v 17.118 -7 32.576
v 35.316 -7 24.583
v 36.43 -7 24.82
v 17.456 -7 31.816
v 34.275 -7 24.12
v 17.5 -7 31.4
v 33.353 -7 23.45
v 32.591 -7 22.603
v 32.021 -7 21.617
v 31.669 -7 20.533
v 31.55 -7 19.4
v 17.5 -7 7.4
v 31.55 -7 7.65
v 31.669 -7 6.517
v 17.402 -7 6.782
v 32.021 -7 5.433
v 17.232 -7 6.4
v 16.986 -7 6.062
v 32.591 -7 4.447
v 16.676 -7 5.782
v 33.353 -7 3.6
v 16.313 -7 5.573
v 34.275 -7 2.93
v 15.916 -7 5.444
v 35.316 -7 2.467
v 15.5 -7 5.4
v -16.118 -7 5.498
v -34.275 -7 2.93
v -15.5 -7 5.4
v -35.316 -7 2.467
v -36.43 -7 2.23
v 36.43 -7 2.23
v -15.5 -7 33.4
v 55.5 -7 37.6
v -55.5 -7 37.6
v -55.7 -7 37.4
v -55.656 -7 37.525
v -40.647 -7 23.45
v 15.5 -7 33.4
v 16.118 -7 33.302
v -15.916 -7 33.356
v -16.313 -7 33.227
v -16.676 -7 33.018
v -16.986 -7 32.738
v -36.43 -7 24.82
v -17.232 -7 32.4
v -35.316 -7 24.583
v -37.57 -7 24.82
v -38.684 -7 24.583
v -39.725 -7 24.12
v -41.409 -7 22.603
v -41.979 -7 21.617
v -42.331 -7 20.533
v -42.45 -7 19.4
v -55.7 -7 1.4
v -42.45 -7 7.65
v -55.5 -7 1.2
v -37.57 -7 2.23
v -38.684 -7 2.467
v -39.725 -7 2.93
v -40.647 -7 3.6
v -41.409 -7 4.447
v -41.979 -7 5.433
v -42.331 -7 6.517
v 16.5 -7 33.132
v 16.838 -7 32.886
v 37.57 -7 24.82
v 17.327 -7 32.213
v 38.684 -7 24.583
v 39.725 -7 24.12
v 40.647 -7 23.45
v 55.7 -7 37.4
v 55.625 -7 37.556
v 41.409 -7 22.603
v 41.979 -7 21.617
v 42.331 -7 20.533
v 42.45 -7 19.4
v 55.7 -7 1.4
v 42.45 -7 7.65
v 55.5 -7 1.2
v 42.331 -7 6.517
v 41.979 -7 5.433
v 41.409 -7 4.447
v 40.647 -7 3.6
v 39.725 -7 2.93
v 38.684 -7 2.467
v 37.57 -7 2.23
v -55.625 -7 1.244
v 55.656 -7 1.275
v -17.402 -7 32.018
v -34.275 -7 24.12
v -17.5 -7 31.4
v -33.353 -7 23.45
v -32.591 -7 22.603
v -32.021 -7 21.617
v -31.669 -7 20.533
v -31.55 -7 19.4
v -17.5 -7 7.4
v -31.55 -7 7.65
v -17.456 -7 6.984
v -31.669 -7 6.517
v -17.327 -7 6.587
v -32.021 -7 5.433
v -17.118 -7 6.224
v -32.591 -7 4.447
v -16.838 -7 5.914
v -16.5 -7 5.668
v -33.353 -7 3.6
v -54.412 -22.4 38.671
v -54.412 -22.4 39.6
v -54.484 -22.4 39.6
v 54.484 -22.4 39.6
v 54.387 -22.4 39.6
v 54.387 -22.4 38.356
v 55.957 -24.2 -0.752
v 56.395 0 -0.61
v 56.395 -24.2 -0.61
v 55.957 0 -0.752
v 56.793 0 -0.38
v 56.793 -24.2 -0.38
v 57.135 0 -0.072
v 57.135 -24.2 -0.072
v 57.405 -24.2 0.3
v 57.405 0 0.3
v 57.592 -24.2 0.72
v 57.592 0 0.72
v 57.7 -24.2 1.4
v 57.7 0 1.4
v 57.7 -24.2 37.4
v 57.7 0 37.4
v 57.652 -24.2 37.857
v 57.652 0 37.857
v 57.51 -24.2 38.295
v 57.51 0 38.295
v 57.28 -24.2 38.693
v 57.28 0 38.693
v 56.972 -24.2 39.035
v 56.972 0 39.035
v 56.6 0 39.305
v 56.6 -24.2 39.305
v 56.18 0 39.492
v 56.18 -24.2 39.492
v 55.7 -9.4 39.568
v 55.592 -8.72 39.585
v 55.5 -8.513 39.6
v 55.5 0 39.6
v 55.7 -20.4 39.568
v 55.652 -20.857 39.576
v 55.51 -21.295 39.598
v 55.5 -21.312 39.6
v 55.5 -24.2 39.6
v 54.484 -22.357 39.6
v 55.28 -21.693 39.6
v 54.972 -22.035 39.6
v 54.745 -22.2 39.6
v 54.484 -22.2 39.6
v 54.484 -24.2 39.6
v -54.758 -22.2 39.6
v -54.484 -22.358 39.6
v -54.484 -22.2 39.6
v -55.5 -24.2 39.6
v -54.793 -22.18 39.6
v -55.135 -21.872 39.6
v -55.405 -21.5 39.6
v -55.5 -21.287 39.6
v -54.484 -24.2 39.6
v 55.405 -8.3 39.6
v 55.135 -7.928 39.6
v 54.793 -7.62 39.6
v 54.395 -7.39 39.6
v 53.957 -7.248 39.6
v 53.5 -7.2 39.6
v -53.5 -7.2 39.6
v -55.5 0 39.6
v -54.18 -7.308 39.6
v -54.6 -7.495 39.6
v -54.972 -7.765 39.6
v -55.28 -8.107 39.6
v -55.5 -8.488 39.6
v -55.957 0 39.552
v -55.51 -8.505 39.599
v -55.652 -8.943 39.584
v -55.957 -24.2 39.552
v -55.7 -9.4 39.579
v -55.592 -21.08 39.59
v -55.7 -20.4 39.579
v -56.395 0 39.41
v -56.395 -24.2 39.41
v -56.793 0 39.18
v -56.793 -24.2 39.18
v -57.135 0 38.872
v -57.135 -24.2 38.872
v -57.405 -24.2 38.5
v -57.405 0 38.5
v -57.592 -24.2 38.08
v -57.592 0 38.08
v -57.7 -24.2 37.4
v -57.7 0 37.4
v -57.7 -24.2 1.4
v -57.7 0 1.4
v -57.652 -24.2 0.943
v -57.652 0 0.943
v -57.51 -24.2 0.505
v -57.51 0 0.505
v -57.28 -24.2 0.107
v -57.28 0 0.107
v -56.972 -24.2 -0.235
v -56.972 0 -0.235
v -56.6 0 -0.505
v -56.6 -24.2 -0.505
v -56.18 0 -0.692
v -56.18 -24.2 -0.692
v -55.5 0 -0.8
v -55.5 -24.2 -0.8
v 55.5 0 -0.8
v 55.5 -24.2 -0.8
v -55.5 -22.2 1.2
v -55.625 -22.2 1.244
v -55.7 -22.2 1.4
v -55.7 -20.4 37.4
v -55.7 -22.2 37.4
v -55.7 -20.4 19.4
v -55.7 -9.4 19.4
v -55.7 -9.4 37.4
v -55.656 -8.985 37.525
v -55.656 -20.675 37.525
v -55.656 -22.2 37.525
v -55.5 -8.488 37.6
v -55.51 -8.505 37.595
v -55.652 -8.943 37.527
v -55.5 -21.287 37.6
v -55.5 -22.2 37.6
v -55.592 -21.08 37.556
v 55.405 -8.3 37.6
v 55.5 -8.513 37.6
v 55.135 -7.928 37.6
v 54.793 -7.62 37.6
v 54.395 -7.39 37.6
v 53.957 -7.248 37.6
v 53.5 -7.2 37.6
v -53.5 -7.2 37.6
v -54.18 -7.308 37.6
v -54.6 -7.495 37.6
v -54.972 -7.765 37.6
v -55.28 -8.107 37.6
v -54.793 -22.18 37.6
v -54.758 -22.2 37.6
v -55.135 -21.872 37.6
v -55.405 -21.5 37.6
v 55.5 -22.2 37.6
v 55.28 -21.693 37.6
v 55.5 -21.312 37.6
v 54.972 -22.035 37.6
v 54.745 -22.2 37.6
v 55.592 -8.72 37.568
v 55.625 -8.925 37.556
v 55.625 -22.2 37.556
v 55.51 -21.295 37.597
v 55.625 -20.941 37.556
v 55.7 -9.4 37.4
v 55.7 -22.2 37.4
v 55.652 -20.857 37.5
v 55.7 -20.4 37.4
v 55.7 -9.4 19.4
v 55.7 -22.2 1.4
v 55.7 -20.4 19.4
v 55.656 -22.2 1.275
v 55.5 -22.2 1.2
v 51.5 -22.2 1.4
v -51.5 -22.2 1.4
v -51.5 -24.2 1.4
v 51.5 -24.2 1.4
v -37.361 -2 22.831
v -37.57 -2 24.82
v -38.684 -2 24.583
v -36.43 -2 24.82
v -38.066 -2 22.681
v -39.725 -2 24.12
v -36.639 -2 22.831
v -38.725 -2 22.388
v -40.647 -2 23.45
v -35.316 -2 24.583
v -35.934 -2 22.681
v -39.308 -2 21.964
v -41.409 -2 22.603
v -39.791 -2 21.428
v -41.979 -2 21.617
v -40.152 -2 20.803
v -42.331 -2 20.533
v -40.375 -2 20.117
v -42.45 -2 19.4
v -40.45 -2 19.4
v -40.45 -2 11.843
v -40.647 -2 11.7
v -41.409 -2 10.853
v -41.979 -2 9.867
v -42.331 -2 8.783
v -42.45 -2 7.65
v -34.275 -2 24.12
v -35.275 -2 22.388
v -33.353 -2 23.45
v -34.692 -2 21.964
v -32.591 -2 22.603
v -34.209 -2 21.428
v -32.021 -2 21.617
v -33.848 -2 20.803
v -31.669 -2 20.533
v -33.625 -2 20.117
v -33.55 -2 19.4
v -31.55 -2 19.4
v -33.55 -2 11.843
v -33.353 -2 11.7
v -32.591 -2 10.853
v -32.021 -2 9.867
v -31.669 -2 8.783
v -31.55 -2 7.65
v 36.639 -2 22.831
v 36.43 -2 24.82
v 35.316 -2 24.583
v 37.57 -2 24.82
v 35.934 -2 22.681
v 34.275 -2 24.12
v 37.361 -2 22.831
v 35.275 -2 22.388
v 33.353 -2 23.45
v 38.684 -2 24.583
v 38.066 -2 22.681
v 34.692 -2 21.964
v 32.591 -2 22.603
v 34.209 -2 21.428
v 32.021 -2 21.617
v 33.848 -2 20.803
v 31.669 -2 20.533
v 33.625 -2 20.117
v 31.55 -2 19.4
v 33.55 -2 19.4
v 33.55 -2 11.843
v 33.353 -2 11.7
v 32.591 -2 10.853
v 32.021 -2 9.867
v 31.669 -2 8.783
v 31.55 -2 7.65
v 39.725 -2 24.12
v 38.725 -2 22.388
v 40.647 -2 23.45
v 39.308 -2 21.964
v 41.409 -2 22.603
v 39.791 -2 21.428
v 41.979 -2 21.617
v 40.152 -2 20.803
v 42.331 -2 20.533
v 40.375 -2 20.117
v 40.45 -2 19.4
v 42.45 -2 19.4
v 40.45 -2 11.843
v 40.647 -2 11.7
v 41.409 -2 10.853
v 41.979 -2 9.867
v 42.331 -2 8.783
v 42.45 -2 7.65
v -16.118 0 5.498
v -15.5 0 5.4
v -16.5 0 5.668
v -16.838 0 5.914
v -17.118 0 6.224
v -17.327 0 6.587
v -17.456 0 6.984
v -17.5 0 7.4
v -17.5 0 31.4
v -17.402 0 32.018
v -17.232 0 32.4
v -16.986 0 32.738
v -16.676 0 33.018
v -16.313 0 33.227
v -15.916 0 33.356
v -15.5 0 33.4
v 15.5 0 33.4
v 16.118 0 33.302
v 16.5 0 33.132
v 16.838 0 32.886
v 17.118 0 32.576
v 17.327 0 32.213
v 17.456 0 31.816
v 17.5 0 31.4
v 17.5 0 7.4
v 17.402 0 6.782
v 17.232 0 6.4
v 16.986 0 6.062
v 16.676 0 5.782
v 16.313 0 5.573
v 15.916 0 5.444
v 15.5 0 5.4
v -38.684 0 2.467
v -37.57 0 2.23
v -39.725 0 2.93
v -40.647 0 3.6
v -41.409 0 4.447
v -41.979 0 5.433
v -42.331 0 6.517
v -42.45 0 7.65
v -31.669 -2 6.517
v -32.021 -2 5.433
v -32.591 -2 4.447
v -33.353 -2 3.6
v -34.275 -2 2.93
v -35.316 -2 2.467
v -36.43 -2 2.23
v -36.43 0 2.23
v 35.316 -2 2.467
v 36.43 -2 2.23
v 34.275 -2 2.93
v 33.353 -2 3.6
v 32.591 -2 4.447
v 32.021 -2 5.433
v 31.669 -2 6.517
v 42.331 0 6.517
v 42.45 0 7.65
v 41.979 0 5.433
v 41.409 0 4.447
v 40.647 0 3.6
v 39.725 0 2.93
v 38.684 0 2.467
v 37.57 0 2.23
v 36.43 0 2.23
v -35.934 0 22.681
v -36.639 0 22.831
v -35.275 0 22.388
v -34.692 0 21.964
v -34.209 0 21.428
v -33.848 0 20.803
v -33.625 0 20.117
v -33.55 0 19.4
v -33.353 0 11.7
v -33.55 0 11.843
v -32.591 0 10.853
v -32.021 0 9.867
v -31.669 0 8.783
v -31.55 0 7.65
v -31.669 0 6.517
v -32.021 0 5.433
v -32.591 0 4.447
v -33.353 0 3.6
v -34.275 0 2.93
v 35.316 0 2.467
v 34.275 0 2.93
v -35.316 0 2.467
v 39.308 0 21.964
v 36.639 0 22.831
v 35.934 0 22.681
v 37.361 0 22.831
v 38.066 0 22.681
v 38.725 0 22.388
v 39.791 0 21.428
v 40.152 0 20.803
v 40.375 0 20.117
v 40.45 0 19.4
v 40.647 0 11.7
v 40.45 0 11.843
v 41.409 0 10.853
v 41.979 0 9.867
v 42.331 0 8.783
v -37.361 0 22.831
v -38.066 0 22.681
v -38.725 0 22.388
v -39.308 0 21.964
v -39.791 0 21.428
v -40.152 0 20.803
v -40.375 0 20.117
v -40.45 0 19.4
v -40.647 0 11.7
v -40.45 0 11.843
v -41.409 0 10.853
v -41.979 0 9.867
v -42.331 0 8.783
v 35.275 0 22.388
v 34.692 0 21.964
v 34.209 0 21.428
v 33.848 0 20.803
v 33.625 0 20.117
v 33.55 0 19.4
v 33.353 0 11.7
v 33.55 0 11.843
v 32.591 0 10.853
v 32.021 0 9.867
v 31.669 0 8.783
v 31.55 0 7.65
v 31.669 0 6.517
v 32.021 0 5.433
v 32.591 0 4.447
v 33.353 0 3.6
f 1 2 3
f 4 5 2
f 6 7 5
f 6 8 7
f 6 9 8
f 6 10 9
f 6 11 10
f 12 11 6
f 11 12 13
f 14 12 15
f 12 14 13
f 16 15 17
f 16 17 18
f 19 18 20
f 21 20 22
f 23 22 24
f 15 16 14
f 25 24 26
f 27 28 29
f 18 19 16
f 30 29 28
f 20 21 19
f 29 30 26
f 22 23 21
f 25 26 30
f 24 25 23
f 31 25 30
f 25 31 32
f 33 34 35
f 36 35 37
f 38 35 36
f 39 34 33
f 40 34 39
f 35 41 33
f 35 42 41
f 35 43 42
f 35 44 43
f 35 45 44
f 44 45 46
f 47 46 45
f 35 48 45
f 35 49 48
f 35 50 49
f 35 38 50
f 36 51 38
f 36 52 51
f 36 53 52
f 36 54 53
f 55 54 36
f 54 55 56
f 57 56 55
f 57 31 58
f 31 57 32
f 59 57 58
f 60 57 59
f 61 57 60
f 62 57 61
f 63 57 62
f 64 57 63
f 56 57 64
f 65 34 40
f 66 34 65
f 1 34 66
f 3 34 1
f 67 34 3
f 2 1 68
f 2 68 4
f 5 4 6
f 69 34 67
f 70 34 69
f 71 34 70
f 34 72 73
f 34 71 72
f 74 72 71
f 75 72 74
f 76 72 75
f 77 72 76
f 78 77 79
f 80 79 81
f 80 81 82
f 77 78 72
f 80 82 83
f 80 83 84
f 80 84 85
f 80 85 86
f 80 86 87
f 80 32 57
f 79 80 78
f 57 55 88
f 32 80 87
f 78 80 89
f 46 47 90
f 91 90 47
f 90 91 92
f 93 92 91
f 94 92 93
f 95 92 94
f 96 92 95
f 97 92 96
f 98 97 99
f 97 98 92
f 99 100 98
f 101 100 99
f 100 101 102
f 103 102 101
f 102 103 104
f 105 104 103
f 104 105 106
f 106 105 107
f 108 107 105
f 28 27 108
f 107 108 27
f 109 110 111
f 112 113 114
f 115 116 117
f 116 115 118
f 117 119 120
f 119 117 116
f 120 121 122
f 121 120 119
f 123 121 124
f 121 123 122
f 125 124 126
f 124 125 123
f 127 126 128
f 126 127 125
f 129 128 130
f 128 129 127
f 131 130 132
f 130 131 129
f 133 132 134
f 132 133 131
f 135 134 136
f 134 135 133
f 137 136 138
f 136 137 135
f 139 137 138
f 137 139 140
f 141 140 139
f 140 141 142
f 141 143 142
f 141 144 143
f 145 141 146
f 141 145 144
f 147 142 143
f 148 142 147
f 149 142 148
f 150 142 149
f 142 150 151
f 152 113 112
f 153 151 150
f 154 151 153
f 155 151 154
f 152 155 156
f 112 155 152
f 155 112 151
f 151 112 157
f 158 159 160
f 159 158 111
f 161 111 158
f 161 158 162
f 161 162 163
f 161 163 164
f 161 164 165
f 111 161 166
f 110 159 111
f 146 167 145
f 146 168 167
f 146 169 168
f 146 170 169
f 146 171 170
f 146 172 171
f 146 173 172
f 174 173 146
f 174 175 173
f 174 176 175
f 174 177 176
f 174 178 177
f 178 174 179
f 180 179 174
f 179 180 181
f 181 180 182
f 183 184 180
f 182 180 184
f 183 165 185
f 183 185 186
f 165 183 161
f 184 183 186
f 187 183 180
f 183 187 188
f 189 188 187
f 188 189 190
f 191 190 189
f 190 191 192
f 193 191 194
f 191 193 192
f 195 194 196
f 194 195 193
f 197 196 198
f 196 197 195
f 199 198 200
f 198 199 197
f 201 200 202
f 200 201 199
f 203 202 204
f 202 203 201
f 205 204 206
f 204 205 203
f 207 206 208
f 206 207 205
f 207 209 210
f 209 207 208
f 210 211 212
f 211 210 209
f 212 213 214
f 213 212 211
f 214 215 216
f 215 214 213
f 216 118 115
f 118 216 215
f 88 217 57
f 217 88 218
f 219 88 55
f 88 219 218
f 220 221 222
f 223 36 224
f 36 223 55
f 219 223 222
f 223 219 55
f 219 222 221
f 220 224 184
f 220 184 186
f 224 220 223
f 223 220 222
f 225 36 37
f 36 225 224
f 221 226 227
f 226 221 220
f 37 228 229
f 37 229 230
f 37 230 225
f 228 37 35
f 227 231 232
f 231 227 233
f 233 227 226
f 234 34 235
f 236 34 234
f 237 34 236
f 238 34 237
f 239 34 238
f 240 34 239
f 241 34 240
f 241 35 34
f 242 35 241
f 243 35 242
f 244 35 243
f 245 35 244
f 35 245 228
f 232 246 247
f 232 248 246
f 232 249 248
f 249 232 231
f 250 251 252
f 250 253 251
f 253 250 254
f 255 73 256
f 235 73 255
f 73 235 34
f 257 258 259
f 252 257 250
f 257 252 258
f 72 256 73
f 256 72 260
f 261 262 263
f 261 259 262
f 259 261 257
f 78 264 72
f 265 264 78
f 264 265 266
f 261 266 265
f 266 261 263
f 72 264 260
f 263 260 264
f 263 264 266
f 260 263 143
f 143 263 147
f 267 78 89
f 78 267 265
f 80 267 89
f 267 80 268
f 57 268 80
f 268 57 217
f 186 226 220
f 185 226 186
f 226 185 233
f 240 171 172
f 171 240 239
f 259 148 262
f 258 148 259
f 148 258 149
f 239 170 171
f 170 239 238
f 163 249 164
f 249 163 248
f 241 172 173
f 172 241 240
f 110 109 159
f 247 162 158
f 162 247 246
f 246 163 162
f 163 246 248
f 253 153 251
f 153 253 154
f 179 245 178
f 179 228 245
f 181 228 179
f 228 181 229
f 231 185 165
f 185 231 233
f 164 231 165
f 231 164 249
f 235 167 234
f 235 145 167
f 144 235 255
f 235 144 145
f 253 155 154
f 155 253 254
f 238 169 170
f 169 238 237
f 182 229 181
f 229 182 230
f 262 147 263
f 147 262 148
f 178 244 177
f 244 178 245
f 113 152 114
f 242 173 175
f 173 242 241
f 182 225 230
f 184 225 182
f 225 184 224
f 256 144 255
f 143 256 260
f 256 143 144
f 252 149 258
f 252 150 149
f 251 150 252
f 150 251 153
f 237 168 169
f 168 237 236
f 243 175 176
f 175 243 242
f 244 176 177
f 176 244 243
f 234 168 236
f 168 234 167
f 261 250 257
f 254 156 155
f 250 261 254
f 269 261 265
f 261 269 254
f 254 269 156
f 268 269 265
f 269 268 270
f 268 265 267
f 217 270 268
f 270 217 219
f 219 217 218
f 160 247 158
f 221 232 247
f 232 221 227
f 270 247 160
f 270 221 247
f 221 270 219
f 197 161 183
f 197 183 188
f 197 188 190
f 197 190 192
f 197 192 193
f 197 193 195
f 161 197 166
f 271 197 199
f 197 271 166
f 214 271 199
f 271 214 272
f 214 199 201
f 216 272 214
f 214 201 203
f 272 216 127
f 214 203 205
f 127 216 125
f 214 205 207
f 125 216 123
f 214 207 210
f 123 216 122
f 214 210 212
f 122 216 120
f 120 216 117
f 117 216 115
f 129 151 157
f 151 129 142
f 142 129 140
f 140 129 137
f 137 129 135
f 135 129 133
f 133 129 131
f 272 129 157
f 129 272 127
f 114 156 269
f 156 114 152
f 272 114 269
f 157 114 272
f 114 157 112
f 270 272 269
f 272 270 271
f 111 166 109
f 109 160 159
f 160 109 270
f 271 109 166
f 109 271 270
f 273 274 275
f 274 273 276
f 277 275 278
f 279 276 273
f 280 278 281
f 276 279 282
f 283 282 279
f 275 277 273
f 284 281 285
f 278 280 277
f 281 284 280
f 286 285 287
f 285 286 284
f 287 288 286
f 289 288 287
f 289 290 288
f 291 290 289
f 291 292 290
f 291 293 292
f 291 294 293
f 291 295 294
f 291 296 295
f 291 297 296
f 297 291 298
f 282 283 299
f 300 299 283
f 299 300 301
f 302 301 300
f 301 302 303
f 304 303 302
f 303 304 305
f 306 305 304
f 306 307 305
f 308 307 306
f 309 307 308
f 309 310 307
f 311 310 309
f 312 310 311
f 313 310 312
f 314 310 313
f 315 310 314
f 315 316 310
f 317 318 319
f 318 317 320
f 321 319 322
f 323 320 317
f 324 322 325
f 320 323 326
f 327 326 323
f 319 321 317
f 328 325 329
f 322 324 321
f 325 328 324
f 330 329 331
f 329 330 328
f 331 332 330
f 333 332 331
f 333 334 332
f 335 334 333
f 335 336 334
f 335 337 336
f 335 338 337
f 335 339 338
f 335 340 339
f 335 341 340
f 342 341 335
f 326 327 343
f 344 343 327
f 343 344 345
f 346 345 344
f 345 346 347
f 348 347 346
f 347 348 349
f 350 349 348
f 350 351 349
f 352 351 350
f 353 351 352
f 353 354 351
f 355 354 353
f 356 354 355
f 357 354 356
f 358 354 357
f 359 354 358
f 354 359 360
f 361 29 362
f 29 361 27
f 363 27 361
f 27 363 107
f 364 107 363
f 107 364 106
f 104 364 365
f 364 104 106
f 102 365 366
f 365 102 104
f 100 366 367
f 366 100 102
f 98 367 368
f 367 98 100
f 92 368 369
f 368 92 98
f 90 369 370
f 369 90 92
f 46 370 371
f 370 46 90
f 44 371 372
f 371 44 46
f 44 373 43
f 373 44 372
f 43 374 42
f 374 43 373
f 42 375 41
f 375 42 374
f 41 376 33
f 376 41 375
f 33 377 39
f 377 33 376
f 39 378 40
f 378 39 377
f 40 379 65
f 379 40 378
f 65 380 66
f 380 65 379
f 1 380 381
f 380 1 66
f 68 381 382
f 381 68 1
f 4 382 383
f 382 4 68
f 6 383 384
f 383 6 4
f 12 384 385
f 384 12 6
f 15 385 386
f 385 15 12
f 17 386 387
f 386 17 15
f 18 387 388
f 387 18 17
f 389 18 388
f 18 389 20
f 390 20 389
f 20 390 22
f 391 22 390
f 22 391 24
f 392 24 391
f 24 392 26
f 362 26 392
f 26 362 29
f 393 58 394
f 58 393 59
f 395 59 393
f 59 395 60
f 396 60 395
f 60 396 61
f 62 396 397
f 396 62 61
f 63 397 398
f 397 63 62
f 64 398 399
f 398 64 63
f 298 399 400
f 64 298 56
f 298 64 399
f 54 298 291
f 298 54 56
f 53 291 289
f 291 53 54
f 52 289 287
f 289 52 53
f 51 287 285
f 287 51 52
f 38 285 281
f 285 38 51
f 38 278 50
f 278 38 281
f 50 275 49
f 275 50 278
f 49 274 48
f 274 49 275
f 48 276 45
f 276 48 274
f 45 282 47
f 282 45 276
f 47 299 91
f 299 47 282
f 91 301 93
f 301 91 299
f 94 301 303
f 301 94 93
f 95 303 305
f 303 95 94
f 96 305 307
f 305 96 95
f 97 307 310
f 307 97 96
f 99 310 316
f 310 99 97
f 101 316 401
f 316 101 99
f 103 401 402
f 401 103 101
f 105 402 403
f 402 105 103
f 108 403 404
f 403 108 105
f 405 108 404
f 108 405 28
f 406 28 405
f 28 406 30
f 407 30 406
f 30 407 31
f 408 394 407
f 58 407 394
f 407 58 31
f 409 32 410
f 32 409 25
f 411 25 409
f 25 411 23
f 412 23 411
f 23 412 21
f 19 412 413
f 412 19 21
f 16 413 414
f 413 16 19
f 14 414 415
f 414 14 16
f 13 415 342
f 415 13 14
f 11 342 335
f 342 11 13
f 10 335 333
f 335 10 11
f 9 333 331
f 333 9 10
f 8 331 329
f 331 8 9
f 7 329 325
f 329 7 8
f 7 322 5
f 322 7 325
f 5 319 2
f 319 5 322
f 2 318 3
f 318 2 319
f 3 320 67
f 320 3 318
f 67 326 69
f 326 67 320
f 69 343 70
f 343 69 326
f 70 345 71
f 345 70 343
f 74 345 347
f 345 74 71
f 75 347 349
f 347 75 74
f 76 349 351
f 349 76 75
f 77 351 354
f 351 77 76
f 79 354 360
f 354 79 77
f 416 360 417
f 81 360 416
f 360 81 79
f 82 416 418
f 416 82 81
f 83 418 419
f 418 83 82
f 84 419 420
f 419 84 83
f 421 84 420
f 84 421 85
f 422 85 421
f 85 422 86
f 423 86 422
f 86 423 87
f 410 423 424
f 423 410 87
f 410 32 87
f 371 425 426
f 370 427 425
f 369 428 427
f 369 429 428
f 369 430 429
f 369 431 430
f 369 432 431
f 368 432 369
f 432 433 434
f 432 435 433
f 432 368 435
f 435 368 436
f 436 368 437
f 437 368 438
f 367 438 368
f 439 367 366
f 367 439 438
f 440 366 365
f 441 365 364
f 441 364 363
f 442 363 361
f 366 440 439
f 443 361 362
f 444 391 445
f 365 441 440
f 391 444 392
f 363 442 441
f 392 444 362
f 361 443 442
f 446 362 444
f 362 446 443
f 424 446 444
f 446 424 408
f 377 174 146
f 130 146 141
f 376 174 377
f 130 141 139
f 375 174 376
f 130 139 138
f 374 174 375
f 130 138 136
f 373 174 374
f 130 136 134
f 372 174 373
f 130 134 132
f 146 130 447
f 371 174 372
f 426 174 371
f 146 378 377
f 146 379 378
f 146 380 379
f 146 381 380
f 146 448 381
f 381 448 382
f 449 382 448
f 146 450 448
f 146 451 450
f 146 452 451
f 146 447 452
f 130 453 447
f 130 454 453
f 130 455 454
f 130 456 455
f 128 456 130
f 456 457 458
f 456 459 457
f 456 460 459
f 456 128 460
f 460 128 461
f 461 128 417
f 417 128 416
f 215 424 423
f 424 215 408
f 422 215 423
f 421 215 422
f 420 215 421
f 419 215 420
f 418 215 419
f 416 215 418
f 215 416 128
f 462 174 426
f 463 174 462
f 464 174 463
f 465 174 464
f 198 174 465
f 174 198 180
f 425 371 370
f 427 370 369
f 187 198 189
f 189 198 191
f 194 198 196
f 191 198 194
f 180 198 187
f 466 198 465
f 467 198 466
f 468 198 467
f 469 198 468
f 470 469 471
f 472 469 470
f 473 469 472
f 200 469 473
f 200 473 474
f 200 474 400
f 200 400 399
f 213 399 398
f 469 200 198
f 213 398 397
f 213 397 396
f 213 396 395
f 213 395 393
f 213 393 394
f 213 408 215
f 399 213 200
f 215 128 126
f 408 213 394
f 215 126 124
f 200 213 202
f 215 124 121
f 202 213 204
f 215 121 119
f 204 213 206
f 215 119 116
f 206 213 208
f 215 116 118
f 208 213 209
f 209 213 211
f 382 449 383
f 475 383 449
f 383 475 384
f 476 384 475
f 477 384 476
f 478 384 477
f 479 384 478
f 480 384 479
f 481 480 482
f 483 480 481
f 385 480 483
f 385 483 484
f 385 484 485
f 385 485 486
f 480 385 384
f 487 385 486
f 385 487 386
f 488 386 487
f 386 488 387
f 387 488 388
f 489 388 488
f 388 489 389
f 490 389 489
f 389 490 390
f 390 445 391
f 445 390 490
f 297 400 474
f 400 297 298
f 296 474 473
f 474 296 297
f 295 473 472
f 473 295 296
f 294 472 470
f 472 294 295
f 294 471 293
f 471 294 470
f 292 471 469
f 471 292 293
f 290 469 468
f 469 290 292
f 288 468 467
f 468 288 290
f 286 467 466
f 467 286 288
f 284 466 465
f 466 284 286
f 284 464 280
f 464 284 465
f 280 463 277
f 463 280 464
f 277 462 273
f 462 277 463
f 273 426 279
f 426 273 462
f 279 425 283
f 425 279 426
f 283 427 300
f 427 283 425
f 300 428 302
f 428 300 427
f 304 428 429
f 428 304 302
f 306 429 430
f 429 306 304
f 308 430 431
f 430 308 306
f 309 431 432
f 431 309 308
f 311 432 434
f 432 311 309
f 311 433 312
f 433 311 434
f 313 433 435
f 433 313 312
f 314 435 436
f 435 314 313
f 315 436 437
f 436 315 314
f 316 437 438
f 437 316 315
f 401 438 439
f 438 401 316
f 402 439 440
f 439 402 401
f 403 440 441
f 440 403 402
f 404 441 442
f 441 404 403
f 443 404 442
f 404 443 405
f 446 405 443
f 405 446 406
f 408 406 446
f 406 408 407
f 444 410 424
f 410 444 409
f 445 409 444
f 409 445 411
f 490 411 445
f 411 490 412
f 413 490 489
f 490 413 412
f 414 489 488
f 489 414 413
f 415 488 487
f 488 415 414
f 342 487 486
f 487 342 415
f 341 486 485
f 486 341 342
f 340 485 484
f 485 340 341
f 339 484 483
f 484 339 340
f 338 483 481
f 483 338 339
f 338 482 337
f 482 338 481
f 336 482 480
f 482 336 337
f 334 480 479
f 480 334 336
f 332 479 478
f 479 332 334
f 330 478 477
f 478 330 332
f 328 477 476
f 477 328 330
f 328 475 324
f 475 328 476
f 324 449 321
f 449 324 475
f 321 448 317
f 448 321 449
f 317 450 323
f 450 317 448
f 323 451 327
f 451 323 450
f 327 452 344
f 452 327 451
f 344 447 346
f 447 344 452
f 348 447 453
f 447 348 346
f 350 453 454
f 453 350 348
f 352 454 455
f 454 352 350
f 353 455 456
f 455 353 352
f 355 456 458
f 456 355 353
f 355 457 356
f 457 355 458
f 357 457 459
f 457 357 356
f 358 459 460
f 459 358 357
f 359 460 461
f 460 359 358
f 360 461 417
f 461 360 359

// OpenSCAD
// Bracket to hold FasTrak Flex transponder to windshield with suction cup.
// Adrian McCarthy 2023-06-20

etag_l = 111;
etag_w = 36;
etag_h = 15;

etag_logo_l = 35;
etag_logo_h = 28;
    
module etag_bracket2(th=2, nozzle_d=0.4) {
    suction_od = 30;
    suction_id = 6.5;
    suction_key = 10.5;
    suction_dx = max(suction_od, etag_l/1.5)/2;
    
    keyhole_h = suction_key/2 + suction_id;

    $fs = nozzle_d/2;

    module keyhole() {
        hull() {
            circle(d=suction_id + nozzle_d);
            translate([0, -keyhole_h])
                circle(d=suction_id + nozzle_d);
        }
        translate([0, -keyhole_h])
            circle(d=suction_key + nozzle_d);
    }
    
    module slot() {
        hull() {
            circle(d=suction_key + nozzle_d);
            translate([0, -keyhole_h])
                circle(d=suction_key + nozzle_d);
        }
    }
    
    module logo_window() {
        offset(th) offset(-th)
            square([etag_logo_l, etag_logo_h], center=true);
    }

    linear_extrude(2, convexity=10) {
        difference() {
            offset(r=th+nozzle_d/2)
                square([etag_l, etag_w], center=true);
            translate([-suction_dx, 0]) keyhole();
            translate([ suction_dx, 0]) keyhole();
            logo_window();
        }
    }
    translate([0, 0, 2]) {
        linear_extrude(5, convexity=10) {
            difference() {
                offset(r=th+nozzle_d/2)
                    square([etag_l, etag_w], center=true);
                translate([-suction_dx, 0]) slot();
                translate([ suction_dx, 0]) slot();
                logo_window();
            }
        }
        translate([0, 0, 5]) {
            difference() {
                linear_extrude(etag_h+nozzle_d, convexity=10) {
                    difference() {
                        offset(r=th+nozzle_d/2)
                            square([etag_l, etag_w], center=true);
                        offset(r=nozzle_d/2)
                            square([etag_l, etag_w], center=true);
                    }
                }
                translate([0, etag_w/2, etag_h/2+nozzle_d]) {
                    rotate([90, 0, 0]) {
                        linear_extrude(etag_w, convexity=4, center=true) {
                            offset(r=th+nozzle_d/2)
                                offset(r=-th)
                                    square([etag_l, etag_h], center=true);
                        }
                    }
                }
            }
            translate([0, 0, etag_h+nozzle_d/2]) {
                linear_extrude(th, convexity=10) {
                    difference() {
                        offset(r=th+nozzle_d/2)
                            square([etag_l, etag_w], center=true);
                        polygon([
                            [-(etag_l-1*th)/2, etag_w/2+th+nozzle_d],
                            [-(etag_l-4*th)/2, -etag_w/2],
                            [ (etag_l-4*th)/2, -etag_w/2],
                            [ (etag_l-1*th)/2, etag_w/2+th+nozzle_d]
                        ]);
                    }
                }
            }
        }
    }
}

// This version is too flimsy.
module foldup_etag_bracket(th=2, layer_h=0.2, nozzle_d=0.4) {
    suction_od = 30;
    suction_id = 6.5;
    suction_key = 10.5;

    keyhole_h1 = 3/2*suction_id + 1/2*suction_key;
    keyhole_h2 = keyhole_h1 - (suction_id + suction_key)/2;
    hanger_d = 4*th + keyhole_h1;
    bracket_w = etag_l/2;

    box_h = th + etag_w + 2*th + etag_h + 2*th + etag_w + 2*th + etag_h;
    tab_w = hanger_d/2;
    tab_h = th;
    tab_l = 2*th;
    slot_w = tab_w + nozzle_d;
    slot_h = tab_h + nozzle_d;
    slot_dx = bracket_w/4;

    $fs = nozzle_d/2;
    
    module profile() {

        module cutout() {
            ellipse_major = etag_w-3*th;
            ellipse_minor = min(ellipse_major, bracket_w-2*th);
            translate([0, -etag_w/2])
                scale([1, ellipse_major/ellipse_minor])
                    circle(d=ellipse_minor);
        }
        
        module tab() {
            depth = tab_h + nozzle_d;
            stem = 4*nozzle_d;
            overhang = 3*nozzle_d;
            clip_profile = [
                [0, 0],
                [0, -depth],
                [overhang, -depth],
                [-nozzle_d, -depth-overhang],
                [-stem, -depth-overhang],
                [-stem, 0]
            ];
            translate([ tab_w/2, 0]) polygon(clip_profile);
            translate([-tab_w/2, 0]) mirror([1, 0, 0]) polygon(clip_profile);
            translate([0, -depth/2]) hull() {
                square([tab_w/2, depth+overhang], center=true);
                translate([0, -depth/4]) circle(d=tab_w/2);
            }
        }
        
        module slot() {
            translate([0, -slot_h/2])
                square([slot_w, slot_h], center=true);
        }

        difference() {
            union() {
                hull() {
                    translate([0, hanger_d/2]) circle(d=hanger_d);
                    translate([0, -box_h/2])
                        square([bracket_w, box_h], center=true);
                }
                translate([0, -box_h]) {
                    translate([-slot_dx, 0]) tab();
                    translate([ slot_dx, 0]) tab();
                }
            }
            union() {
                translate([0, keyhole_h1]) hull() {
                    circle(d=suction_id+nozzle_d);
                    translate([0, -suction_id]) circle(d=suction_id+nozzle_d);
                }
                translate([0, keyhole_h2]) circle(d=suction_key+nozzle_d);
            }
            translate([-slot_dx, 0]) slot();
            translate([ slot_dx, 0]) slot();
            translate([0, -th]) {
                cutout();
                translate([0, -(etag_w+2*th+etag_h+2*th)]) {
                    cutout();
                }
            }
        }
    }
    
    module groove(w) {
        rotate([90, 0, 90]) {
            linear_extrude(w, center=true) {
                polygon([
                    [layer_h/2, layer_h],
                    [layer_h/2 + th, layer_h+th],
                    [-(layer_h/2 + th), layer_h+th],
                    [-(layer_h/2), layer_h]
                ]);
            }
        }
    }

    module brace() {
        translate([-th, 0]) square([2*th, hanger_d]);
    }
    
    module label() {
        label = "FASTRAK FLEX";
        typeface = "Liberation Sans:style=Bold";
        label_w = 10.2; // At size=1, the text is approximately 10 mm wide.
        type_size = (bracket_w-th)/label_w;
            text(label, font=typeface, size=type_size,
                 halign="center", valign="center");
    }
    
    difference() {
        linear_extrude(th, convexity=8) profile();
        translate([0, -(th+etag_w+th), 0]) {
            groove(bracket_w+0.1);
            translate([0, -(th+etag_h+th), 0]) {
                groove(bracket_w+0.1);
                translate([0, -(th+etag_w+th), 0]) {
                    groove(bracket_w+0.1);
                }
            }
        }
    }
    
    difference() {
        linear_extrude(3*th, convexity=4) {
            intersection() {
                translate([-bracket_w/2, 0]) square([bracket_w, hanger_d]);
                profile();
            }
        }
        translate([0, 0, th]) {
            linear_extrude(3*th) {
                hull() {
                    translate([0, keyhole_h1]) circle(d=suction_key+nozzle_d);
                    translate([0, keyhole_h2]) circle(d=suction_key+nozzle_d);
                }
            }
        }
    }

    translate([0, -th, th-0.1]) {
        linear_extrude(3*layer_h, convexity=10) {
            translate([0, -(etag_w+2*th+etag_h/2)]) {
                label();
                translate([0, -(etag_h/2+2*th+etag_w+2*th+etag_h/2)]) {
                    label();
                }
            }
        }
    }
}


module etag_bracket_upright(th=2, nozzle_d=0.4) {
    // Depsite overhangs, it might be better for heat dissipation and strength
    // to print upright rather than on its back.
    translate([0, 0, etag_h+2*th+nozzle_d])
        rotate([90, 0, 0])
            etag_bracket2(th=th, nozzle_d=nozzle_d);
}

etag_bracket_upright();
